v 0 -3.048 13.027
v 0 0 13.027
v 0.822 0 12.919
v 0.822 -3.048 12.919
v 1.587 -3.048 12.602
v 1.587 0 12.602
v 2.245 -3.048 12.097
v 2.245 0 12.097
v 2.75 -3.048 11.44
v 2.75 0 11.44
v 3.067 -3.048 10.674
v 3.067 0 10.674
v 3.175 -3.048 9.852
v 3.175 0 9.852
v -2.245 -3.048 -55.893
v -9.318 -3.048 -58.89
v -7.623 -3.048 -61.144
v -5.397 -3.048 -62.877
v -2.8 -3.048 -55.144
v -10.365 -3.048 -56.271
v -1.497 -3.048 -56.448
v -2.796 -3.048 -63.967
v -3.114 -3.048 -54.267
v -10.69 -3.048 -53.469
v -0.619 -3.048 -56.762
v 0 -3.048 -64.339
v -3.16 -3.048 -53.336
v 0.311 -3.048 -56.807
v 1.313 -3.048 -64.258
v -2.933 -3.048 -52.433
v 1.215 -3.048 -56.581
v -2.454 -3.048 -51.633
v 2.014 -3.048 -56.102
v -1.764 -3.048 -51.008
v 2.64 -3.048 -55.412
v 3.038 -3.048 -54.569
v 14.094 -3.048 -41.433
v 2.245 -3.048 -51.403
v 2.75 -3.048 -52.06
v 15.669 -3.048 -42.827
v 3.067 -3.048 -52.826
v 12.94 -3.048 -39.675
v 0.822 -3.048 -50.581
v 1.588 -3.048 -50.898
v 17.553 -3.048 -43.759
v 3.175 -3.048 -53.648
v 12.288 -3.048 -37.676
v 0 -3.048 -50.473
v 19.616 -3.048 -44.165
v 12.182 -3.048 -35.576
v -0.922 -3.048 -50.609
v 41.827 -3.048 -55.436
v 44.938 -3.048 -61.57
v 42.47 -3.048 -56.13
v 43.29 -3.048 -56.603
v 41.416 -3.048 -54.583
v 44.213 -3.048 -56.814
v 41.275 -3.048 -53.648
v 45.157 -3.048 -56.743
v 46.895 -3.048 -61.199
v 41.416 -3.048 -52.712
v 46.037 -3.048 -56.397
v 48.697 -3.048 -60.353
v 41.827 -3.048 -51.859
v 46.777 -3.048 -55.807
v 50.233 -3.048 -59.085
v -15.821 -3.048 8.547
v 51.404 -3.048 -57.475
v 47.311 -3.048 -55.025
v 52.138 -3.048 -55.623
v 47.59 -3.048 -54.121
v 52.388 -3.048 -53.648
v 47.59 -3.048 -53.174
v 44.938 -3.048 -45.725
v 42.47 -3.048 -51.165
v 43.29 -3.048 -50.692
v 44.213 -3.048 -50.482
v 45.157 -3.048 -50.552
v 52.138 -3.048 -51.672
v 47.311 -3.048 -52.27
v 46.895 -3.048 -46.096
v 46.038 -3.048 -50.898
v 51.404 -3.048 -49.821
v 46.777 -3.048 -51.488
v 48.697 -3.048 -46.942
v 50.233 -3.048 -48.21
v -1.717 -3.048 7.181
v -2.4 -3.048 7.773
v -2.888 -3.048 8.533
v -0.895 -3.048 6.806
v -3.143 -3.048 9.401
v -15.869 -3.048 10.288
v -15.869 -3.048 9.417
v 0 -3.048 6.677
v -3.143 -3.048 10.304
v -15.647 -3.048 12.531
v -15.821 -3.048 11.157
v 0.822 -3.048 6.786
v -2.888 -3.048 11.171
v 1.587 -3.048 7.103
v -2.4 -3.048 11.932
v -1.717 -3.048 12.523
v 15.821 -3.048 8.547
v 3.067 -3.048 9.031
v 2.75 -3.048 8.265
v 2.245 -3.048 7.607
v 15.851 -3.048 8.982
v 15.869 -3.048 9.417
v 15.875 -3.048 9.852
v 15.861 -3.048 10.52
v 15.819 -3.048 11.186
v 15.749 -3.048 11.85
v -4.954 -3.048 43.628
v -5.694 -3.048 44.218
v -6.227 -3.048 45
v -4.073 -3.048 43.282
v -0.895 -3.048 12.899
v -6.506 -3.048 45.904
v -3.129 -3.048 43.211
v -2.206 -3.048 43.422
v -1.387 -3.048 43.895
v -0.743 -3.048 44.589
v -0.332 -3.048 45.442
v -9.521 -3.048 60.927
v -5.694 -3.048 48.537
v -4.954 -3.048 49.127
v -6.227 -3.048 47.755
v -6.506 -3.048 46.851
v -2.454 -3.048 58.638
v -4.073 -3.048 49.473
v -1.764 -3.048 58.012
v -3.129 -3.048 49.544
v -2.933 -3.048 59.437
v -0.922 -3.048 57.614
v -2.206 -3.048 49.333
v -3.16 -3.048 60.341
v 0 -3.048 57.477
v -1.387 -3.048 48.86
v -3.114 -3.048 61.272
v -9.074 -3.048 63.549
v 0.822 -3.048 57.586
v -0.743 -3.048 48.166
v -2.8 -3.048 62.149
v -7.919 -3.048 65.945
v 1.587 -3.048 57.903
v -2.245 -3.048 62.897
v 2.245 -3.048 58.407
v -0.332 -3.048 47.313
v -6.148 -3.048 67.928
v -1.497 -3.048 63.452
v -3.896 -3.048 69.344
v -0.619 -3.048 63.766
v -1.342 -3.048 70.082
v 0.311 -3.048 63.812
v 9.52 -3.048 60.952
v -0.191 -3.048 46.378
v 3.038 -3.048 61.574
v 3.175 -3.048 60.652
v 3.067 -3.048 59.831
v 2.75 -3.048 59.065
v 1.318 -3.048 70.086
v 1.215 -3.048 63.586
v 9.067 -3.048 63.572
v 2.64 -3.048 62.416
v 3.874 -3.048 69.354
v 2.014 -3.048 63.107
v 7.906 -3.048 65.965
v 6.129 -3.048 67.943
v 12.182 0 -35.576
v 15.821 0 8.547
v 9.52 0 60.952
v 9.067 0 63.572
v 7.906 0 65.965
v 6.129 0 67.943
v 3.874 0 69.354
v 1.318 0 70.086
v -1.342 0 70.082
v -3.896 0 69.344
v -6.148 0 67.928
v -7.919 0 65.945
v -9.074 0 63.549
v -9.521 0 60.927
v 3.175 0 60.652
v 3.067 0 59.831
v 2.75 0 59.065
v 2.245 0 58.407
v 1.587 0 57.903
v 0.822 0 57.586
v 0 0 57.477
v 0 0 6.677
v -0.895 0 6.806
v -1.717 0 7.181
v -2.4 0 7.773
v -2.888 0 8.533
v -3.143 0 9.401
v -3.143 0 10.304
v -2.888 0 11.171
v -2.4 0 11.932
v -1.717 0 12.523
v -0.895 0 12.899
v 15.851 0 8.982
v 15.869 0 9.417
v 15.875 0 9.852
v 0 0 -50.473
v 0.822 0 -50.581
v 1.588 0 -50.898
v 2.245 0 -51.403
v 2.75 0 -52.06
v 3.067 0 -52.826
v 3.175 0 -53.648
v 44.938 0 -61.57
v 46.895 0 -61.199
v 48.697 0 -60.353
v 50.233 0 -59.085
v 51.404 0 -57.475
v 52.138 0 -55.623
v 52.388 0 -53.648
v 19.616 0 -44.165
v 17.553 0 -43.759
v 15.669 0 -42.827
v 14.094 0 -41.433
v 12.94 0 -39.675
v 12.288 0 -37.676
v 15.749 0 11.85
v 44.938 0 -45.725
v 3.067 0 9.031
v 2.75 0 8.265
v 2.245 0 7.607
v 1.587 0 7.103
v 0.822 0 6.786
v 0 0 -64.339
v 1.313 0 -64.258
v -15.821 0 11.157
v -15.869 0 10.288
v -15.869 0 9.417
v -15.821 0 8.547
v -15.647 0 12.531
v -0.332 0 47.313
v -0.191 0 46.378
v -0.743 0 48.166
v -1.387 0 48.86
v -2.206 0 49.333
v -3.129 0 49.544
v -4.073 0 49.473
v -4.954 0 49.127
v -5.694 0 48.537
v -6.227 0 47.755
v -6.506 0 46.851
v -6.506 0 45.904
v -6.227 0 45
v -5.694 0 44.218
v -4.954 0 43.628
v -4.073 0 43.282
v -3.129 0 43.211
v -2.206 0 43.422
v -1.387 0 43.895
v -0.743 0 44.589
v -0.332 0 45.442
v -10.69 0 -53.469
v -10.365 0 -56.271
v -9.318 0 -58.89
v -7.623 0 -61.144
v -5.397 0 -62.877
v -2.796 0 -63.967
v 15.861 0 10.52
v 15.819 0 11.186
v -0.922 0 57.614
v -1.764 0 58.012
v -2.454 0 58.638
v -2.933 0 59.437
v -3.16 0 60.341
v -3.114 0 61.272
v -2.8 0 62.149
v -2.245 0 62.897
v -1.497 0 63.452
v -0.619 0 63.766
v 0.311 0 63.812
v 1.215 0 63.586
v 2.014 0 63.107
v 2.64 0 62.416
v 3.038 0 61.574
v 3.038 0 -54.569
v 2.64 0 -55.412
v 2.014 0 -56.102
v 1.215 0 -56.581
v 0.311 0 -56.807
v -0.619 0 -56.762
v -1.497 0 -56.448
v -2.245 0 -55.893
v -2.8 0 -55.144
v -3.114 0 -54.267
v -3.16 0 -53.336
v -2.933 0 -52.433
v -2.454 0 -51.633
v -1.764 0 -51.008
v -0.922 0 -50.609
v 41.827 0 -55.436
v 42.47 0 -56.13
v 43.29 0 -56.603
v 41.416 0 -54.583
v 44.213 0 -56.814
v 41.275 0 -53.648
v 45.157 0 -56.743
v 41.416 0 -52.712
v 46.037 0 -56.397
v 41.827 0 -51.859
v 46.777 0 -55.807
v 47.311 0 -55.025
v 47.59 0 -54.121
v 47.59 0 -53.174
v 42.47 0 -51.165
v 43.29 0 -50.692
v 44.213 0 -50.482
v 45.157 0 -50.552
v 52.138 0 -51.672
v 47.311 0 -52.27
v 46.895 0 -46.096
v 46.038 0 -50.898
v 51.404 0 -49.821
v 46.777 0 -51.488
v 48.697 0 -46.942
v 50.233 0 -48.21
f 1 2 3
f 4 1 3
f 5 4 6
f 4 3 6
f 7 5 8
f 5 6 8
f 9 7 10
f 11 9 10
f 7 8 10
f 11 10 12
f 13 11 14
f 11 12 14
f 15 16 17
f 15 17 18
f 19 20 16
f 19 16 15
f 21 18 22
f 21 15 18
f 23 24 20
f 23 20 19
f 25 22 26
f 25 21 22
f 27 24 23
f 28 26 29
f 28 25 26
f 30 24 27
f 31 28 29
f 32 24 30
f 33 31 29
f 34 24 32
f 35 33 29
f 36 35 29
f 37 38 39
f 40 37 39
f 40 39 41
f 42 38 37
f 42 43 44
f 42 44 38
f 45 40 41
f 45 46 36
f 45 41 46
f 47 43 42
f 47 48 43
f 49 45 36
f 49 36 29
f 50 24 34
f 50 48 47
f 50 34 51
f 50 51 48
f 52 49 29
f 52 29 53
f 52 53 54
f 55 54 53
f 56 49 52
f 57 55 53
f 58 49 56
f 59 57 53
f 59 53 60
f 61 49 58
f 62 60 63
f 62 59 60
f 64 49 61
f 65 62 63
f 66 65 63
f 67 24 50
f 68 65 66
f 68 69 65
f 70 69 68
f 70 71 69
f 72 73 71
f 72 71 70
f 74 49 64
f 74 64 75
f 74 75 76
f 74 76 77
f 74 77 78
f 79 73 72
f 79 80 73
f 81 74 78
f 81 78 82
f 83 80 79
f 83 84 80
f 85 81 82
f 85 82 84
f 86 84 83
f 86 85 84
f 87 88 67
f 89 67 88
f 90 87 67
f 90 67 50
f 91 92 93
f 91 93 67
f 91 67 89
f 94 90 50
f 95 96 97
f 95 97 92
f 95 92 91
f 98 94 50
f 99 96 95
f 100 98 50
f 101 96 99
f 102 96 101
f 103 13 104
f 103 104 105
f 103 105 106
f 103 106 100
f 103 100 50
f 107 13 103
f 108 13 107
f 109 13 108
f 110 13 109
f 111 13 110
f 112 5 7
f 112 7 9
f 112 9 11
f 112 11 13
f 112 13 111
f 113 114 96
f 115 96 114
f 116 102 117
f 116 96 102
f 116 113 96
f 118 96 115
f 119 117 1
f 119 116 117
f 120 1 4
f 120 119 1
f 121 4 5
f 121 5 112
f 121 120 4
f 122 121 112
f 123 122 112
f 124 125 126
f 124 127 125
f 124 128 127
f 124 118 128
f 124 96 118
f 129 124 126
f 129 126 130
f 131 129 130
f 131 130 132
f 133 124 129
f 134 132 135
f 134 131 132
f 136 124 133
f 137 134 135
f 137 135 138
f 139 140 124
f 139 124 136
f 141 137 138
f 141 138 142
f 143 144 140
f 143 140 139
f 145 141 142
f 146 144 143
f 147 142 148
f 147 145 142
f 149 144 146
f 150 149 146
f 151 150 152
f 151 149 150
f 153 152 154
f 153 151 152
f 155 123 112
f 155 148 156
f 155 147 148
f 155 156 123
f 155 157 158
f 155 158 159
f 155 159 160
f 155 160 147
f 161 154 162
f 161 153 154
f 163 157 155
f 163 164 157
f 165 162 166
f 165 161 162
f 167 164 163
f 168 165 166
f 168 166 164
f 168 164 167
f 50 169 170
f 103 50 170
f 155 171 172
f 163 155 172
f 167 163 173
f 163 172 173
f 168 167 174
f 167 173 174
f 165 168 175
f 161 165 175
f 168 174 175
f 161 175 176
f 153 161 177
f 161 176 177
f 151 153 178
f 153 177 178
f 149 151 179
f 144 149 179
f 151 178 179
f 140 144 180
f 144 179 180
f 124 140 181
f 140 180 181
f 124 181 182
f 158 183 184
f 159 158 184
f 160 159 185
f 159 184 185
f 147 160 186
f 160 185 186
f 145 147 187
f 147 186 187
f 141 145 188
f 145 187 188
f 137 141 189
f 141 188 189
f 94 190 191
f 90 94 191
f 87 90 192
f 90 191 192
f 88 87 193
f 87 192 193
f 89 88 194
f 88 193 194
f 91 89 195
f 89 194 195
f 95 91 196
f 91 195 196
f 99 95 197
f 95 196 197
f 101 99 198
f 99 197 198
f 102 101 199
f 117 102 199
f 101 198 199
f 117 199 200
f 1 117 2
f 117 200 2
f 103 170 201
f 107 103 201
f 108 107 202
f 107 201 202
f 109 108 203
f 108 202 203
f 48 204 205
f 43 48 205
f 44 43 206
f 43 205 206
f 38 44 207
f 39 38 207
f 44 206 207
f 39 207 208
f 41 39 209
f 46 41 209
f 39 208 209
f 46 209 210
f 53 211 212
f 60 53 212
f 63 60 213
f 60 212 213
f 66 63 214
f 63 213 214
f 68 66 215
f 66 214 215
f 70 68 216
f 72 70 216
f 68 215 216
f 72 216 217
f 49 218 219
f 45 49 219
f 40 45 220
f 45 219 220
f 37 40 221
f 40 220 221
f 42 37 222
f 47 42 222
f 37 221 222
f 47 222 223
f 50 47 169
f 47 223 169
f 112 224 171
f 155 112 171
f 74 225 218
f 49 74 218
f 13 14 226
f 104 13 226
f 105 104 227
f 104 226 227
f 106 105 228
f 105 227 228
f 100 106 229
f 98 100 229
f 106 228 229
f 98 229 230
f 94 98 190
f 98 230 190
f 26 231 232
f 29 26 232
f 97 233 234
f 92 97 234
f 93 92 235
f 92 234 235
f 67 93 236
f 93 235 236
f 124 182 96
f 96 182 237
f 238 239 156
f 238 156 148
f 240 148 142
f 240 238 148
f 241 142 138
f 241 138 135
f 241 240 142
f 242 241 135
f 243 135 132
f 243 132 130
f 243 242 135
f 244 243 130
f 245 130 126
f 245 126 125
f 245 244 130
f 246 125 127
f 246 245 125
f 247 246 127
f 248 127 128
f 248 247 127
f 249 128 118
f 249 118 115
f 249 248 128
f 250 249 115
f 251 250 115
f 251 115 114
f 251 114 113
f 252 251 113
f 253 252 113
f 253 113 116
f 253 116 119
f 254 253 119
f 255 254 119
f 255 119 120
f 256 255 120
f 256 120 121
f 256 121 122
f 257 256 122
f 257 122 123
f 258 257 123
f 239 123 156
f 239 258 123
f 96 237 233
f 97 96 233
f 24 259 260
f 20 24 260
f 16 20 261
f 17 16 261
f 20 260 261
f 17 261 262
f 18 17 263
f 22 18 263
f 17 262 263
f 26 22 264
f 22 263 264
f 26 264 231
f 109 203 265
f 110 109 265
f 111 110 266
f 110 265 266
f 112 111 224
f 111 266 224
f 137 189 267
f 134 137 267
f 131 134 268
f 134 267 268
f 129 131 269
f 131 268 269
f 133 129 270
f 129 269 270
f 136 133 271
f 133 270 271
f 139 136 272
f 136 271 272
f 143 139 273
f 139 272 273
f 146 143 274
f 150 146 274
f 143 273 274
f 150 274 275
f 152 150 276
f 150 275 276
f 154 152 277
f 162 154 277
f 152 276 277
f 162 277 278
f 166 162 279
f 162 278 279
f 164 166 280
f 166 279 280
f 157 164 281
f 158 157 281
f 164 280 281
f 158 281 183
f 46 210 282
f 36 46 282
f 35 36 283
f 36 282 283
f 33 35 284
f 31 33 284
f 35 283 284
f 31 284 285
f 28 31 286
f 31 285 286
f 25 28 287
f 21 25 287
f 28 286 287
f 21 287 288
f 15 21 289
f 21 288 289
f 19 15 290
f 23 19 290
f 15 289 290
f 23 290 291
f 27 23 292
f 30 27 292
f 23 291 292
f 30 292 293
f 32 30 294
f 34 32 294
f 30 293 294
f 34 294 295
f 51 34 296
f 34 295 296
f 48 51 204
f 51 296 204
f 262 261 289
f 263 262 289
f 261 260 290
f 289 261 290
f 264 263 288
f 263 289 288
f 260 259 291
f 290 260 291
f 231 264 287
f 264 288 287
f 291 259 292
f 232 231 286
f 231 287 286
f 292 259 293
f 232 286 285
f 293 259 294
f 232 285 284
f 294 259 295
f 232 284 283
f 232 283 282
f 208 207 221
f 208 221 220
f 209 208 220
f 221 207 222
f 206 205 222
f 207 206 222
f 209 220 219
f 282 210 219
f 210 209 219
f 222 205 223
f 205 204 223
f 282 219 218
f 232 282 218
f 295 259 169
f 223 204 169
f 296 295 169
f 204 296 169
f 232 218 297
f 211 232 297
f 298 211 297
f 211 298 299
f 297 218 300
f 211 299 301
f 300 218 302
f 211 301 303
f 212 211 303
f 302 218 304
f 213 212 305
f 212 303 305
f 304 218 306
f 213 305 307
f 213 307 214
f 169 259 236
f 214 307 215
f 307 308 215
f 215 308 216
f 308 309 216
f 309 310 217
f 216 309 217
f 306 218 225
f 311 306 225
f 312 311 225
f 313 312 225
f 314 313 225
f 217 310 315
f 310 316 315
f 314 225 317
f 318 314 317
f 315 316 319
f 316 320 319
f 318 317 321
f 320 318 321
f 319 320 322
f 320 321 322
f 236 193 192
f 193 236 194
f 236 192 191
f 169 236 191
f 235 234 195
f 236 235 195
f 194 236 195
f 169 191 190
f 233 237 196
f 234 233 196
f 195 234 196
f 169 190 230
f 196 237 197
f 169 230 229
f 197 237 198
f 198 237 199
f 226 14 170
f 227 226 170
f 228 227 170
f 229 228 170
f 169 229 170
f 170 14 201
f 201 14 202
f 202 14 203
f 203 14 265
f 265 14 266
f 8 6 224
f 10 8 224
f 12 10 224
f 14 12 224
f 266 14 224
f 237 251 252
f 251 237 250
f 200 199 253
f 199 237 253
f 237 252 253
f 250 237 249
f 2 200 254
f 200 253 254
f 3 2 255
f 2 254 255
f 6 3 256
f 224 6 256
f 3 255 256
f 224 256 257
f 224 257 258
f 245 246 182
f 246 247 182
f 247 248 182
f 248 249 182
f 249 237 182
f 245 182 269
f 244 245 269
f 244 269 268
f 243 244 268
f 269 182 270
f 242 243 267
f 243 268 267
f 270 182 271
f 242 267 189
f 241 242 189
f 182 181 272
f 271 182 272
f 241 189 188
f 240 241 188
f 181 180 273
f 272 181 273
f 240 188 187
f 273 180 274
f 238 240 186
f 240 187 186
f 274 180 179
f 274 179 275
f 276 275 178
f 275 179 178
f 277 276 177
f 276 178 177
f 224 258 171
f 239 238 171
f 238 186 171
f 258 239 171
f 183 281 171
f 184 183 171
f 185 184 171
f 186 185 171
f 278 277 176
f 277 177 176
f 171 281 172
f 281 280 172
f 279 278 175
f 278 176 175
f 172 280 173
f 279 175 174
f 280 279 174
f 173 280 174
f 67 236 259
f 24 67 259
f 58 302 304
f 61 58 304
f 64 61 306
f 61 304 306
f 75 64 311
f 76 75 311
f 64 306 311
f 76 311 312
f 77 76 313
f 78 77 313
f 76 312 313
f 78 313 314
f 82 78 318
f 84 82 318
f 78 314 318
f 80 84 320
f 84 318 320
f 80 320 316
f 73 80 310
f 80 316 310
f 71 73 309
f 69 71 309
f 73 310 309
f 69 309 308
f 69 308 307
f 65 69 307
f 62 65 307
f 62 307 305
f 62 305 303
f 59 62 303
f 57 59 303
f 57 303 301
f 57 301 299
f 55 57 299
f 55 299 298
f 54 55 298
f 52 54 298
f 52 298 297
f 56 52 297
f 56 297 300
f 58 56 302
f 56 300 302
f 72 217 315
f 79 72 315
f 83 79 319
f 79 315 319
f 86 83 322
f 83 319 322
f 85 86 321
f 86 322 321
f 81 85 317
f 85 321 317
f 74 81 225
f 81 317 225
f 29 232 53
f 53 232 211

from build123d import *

# Parameters (mm, degrees)
F0_R     = 3.175
F1_DEPTH = 3.048


# Not quite as in the source:
# - ends of sketch curves that miss each other by under 0.0002 mm in the source are joined


with BuildPart() as f1:
    # F0 (on Front) → F1 (new body)
    with BuildSketch(Plane.XZ):
        with BuildLine():
            ThreePointArc((0, -42.9560914541), (7.5600620245, -46.0875716771), (10.6915422474, -53.6476337016))
            Line((10.6915422474, -53.6476337016), (36.5125, -53.6476337016))
            ThreePointArc((36.5125, -53.6476337016), (39.0126759444, -47.8649515069), (44.9381789581, -45.725160126))
            Line((44.9381789581, -45.725160126), (19.6163710563, -44.1648504083))
            ThreePointArc((19.6163710563, -44.1648504083), (14.0942781367, -41.4328681595), (12.1820328049, -35.5762005907))
            Line((12.1820328049, -35.5762005907), (15.8212777121, 8.5474538872))
            ThreePointArc((15.8212777121, 8.5474538872), (10.7540722598, -1.825200003), (0, -6.0226337016))
            Line((0, -6.0226337016), (0, -42.9560914541))
        make_face()
        with BuildLine():
            ThreePointArc((-10.690047341, -53.4688503814), (-7.4965860966, -46.0246242876), (0, -42.9560914541))
            Line((0, -42.9560914541), (0, -6.0226337016))
            ThreePointArc((0, -6.0226337016), (-10.7540722823, -1.8251999914), (-15.8212777256, 8.5474539313))
            Line((-15.8212777256, 8.5474539313), (-10.690047341, -53.4688503814))
        make_face()
        with BuildLine():
            Line((10.6915422474, -53.6476337016), (3.175, -53.6476337016))
            ThreePointArc((3.175, -53.6476337016), (-2.2450640303, -55.8926977318), (0, -50.4726337016))
            Line((0, -50.4726337016), (0, -42.9560914541))
            ThreePointArc((0, -42.9560914541), (-7.4965860966, -46.0246242876), (-10.690047341, -53.4688503814))
            ThreePointArc((-10.690047341, -53.4688503814), (-7.6230094139, -61.1442197982), (0, -64.339175949))
            Line((0, -64.339175949), (1.3126312246, -64.2582922531))
            ThreePointArc((1.3126312246, -64.2582922531), (8.0107155679, -60.7284183839), (10.6915422474, -53.6476337016))
        make_face()
        with BuildLine():
            ThreePointArc((0, -50.4726337016), (2.2450640303, -51.4025696713), (3.175, -53.6476337016))
            Line((3.175, -53.6476337016), (10.6915422474, -53.6476337016))
            ThreePointArc((10.6915422474, -53.6476337016), (7.5600620245, -46.0875716771), (0, -42.9560914541))
            Line((0, -42.9560914541), (0, -50.4726337016))
        make_face()
        with BuildLine():
            Line((36.5125, -53.6476337016), (10.6915422474, -53.6476337016))
            ThreePointArc((10.6915422474, -53.6476337016), (8.0107155679, -60.7284183839), (1.3126312246, -64.2582922531))
            Line((1.3126312246, -64.2582922531), (44.9381789581, -61.5701072771))
            ThreePointArc((44.9381789581, -61.5701072771), (39.0126759444, -59.4303158963), (36.5125, -53.6476337016))
        make_face()
        with BuildLine():
            ThreePointArc((44.9381789581, -45.725160126), (39.0126759444, -47.8649515069), (36.5125, -53.6476337016))
            ThreePointArc((36.5125, -53.6476337016), (39.0126759444, -59.4303158963), (44.9381789581, -61.5701072771))
            ThreePointArc((44.9381789581, -61.5701072771), (50.2326821947, -59.0849577571), (52.3875, -53.6476337016))
            ThreePointArc((52.3875, -53.6476337016), (50.2326821947, -48.210309646), (44.9381789581, -45.725160126))
        make_face()
        with BuildLine():
            ThreePointArc((47.625, -53.6476337016), (44.45, -56.8226337016), (41.275, -53.6476337016))
            ThreePointArc((41.275, -53.6476337016), (44.45, -50.4726337016), (47.625, -53.6476337016))
        make_face(mode=Mode.SUBTRACT)
        with BuildLine():
            ThreePointArc((-15.8212777256, 8.5474539313), (-10.7540722823, -1.8251999914), (0, -6.0226337016))
            Line((0, -6.0226337016), (0, 6.6773662984))
            ThreePointArc((0, 6.6773662984), (-3.1750000049, 9.8523662984), (0, 13.0273662984))
            Line((0, 13.0273662984), (0, 25.7273662984))
            ThreePointArc((0, 25.7273662984), (-10.2345652868, 21.9878225524), (-15.6473851089, 12.5309787019))
            Line((-15.6473851089, 12.5309787019), (-15.8212782601, 11.157272185))
            ThreePointArc((-15.8212782601, 11.157272185), (-15.8750000049, 9.8523630471), (-15.8212777256, 8.5474539313))
        make_face()
        with BuildLine():
            Line((0, 6.6773662984), (0, -6.0226337016))
            ThreePointArc((0, -6.0226337016), (10.7540722598, -1.825200003), (15.8212777121, 8.5474538872))
            ThreePointArc((15.8212777121, 8.5474538872), (15.8615637383, 9.1993574002), (15.8749999951, 9.8523662984))
            ThreePointArc((15.8749999951, 9.8523662984), (15.843418635, 10.8532213331), (15.7488002092, 11.8500942118))
            ThreePointArc((15.7488002092, 11.8500942118), (10.4952773724, 21.7630664363), (0, 25.7273662984))
            Line((0, 25.7273662984), (0, 13.0273662984))
            ThreePointArc((0, 13.0273662984), (2.2450640271, 12.097430327), (3.1749999951, 9.8523662984))
            ThreePointArc((3.1749999951, 9.8523662984), (2.2450640271, 7.6073022699), (0, 6.6773662984))
        make_face()
        with BuildLine():
            ThreePointArc((0, 25.7273662984), (10.4952773724, 21.7630664363), (15.7488002092, 11.8500942118))
            Line((15.7488002092, 11.8500942118), (9.5202989573, 60.9515865588))
            ThreePointArc((9.5202989573, 60.9515865588), (9.5238246668, 60.801994892), (9.525, 60.6523662984))
            ThreePointArc((9.525, 60.6523662984), (6.7351920908, 53.9171742076), (0, 51.1273662984))
            Line((0, 51.1273662984), (0, 25.7273662984))
        make_face()
        with BuildLine():
            Line((-9.5210262398, 60.9274741696), (-15.6473851089, 12.5309787019))
            ThreePointArc((-15.6473851089, 12.5309787019), (-10.2345652868, 21.9878225524), (0, 25.7273662984))
            Line((0, 25.7273662984), (0, 51.1273662984))
            ThreePointArc((0, 51.1273662984), (-6.8317650528, 54.0151521793), (-9.5210262398, 60.9274741696))
        make_face()
        with Locations((-3.3664405459, 46.3775662984)):
            Circle(F0_R, mode=Mode.SUBTRACT)
        with BuildLine():
            ThreePointArc((9.5202989573, 60.9515865588), (-0.0120616774, 70.1773586615), (-9.5210262398, 60.9274741696))
            ThreePointArc((-9.5210262398, 60.9274741696), (-6.8317650528, 54.0151521793), (0, 51.1273662984))
            ThreePointArc((0, 51.1273662984), (6.7351920908, 53.9171742076), (9.525, 60.6523662984))
            ThreePointArc((9.525, 60.6523662984), (9.5238246668, 60.801994892), (9.5202989573, 60.9515865588))
        make_face()
        with BuildLine():
            ThreePointArc((3.175, 60.6523662984), (2.2450640303, 58.4073022682), (0, 57.4773662984))
            ThreePointArc((0, 57.4773662984), (-2.2450640303, 62.8974303287), (3.175, 60.6523662984))
        make_face(mode=Mode.SUBTRACT)
    extrude(amount=F1_DEPTH)


solid = f1.part
